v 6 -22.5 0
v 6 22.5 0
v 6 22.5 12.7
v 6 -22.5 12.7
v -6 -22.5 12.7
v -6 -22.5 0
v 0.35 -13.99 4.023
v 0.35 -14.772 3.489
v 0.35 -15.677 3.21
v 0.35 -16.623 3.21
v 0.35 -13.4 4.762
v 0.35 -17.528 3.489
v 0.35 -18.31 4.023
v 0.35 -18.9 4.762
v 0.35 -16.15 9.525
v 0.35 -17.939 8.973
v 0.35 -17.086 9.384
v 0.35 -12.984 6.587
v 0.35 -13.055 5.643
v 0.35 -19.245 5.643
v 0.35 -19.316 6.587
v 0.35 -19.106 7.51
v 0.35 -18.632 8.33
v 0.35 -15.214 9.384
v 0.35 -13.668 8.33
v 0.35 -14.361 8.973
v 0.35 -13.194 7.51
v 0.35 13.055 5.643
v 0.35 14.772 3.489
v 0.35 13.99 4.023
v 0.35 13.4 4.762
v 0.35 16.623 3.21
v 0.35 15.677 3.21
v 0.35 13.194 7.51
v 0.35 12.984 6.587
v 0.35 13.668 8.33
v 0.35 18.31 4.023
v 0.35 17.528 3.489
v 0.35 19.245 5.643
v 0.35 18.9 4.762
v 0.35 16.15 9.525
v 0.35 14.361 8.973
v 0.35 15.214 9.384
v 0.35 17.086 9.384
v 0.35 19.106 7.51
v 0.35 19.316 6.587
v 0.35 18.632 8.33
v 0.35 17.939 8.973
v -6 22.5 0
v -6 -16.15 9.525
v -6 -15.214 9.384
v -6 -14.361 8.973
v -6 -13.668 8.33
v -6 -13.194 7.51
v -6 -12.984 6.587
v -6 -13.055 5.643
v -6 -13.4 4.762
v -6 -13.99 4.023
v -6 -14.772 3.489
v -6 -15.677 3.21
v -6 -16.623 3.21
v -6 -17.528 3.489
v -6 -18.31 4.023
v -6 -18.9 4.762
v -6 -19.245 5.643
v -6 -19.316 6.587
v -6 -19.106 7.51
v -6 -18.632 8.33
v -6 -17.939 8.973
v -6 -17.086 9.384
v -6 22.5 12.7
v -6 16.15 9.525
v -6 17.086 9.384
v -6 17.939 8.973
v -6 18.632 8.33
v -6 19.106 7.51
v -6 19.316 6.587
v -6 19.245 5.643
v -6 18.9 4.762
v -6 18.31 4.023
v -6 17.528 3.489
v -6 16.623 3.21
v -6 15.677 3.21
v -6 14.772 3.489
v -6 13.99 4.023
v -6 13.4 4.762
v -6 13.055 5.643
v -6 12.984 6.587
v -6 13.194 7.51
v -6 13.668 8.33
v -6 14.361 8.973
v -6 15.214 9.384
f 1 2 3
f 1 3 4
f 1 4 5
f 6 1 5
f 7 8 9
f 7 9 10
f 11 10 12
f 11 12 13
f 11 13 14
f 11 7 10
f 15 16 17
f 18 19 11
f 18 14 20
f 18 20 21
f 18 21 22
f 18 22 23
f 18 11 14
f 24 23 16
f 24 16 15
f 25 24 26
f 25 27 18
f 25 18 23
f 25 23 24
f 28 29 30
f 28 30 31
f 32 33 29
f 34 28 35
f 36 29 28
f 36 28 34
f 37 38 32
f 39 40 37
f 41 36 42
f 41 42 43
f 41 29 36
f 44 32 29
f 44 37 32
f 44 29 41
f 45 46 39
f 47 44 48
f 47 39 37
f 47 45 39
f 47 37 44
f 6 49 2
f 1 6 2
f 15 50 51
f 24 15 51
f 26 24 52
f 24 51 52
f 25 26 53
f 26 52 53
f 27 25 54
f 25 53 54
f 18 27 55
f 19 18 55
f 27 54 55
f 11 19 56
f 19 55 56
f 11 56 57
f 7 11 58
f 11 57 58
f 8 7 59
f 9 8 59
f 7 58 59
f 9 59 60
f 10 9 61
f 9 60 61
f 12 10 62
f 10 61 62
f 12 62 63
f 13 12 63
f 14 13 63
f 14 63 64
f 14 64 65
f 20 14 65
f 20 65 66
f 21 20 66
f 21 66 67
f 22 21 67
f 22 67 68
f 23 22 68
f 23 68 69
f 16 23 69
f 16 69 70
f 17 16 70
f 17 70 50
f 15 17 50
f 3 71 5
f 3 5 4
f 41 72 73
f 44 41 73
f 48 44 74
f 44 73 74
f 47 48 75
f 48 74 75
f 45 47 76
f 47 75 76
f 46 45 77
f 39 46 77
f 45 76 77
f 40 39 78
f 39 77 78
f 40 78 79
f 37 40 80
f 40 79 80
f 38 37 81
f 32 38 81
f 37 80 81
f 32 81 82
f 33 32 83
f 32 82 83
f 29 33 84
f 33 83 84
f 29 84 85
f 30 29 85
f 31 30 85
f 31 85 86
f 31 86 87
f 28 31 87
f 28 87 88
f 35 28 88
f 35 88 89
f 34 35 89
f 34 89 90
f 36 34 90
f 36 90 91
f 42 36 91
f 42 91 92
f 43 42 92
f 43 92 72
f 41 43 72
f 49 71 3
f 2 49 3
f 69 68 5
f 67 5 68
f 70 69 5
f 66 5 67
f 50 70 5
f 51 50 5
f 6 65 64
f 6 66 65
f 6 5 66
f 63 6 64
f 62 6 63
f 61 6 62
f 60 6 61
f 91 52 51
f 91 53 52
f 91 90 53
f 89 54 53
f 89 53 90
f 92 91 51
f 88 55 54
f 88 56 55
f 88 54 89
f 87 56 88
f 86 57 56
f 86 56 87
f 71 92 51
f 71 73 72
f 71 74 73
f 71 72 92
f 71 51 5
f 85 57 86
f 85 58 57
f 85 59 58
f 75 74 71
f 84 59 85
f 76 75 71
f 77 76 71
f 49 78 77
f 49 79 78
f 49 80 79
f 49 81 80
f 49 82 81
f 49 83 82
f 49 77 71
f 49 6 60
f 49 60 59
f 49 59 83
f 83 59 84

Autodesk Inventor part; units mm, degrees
ref_plane "YZ Plane" through (0, 0, 0) normal (1, 0, 0) x (0, 1, 0)
ref_plane "XZ Plane" through (0, 0, 0) normal (0, 1, 0) x (-1, 0, 0)
ref_plane "XY Plane" through (0, 0, 0) normal (0, 0, 1) x (1, 0, 0)
sketch "Sketch1" plane through (0, 0, 0) normal (0, 0, 1) x (1, 0, 0)
  line L0 (6, -22.5) -> (-6, -22.5)
  line L1 (-6, -22.5) -> (-6, 22.5)
  line L2 (-6, 22.5) -> (6, 22.5)
  line L3 (6, 22.5) -> (6, -22.5)
  line L4 (6, -22.5) -> (-6, 22.5) construction
  line L5 (-6, -22.5) -> (6, 22.5) construction
  line L6 (-5.1503, -35.0501) -> (13.5409, -35.0501)
  point P0 (0, 0)
  point P1 (4.1953, 105.9109)
  point P2 (0, 0)
  point P3 (11.236, -97.2891)
  point P4 (-6, 0)
  dimension "d0" = 12
  dimension "d1" = 45
  dimension "d2" = 57.55
extrude "Extrusion1" add sketch "Sketch1" along normal blind 12.7
sketch "Sketch3" plane through (-6, -22.5, 0) normal (-1, 0, 0) x (0, 0, 1)
  circle A0 centre (6.35, 38.65) radius 3.175
  line L0 (12.7, 45) -> (12.7, 0) projected
  line L1 (0, 45) -> (12.7, 45) projected
  circle A1 centre (6.35, 6.35) radius 3.175
  line L2 (0, 0) -> (12.7, 0) projected
  point P0 (0, 22.5)
  point P1 (6.35, 45)
  dimension "d10" = 6.35
  dimension "d11" = 6.35
  dimension "d12" = 6.35
  dimension "d13" = 6.35
  dimension "d14" = 6.35
  dimension "d15" = 6.35
extrude "Extrusion3" cut sketch "Sketch3" against normal blind 6.35
properties part number "EndCap"
